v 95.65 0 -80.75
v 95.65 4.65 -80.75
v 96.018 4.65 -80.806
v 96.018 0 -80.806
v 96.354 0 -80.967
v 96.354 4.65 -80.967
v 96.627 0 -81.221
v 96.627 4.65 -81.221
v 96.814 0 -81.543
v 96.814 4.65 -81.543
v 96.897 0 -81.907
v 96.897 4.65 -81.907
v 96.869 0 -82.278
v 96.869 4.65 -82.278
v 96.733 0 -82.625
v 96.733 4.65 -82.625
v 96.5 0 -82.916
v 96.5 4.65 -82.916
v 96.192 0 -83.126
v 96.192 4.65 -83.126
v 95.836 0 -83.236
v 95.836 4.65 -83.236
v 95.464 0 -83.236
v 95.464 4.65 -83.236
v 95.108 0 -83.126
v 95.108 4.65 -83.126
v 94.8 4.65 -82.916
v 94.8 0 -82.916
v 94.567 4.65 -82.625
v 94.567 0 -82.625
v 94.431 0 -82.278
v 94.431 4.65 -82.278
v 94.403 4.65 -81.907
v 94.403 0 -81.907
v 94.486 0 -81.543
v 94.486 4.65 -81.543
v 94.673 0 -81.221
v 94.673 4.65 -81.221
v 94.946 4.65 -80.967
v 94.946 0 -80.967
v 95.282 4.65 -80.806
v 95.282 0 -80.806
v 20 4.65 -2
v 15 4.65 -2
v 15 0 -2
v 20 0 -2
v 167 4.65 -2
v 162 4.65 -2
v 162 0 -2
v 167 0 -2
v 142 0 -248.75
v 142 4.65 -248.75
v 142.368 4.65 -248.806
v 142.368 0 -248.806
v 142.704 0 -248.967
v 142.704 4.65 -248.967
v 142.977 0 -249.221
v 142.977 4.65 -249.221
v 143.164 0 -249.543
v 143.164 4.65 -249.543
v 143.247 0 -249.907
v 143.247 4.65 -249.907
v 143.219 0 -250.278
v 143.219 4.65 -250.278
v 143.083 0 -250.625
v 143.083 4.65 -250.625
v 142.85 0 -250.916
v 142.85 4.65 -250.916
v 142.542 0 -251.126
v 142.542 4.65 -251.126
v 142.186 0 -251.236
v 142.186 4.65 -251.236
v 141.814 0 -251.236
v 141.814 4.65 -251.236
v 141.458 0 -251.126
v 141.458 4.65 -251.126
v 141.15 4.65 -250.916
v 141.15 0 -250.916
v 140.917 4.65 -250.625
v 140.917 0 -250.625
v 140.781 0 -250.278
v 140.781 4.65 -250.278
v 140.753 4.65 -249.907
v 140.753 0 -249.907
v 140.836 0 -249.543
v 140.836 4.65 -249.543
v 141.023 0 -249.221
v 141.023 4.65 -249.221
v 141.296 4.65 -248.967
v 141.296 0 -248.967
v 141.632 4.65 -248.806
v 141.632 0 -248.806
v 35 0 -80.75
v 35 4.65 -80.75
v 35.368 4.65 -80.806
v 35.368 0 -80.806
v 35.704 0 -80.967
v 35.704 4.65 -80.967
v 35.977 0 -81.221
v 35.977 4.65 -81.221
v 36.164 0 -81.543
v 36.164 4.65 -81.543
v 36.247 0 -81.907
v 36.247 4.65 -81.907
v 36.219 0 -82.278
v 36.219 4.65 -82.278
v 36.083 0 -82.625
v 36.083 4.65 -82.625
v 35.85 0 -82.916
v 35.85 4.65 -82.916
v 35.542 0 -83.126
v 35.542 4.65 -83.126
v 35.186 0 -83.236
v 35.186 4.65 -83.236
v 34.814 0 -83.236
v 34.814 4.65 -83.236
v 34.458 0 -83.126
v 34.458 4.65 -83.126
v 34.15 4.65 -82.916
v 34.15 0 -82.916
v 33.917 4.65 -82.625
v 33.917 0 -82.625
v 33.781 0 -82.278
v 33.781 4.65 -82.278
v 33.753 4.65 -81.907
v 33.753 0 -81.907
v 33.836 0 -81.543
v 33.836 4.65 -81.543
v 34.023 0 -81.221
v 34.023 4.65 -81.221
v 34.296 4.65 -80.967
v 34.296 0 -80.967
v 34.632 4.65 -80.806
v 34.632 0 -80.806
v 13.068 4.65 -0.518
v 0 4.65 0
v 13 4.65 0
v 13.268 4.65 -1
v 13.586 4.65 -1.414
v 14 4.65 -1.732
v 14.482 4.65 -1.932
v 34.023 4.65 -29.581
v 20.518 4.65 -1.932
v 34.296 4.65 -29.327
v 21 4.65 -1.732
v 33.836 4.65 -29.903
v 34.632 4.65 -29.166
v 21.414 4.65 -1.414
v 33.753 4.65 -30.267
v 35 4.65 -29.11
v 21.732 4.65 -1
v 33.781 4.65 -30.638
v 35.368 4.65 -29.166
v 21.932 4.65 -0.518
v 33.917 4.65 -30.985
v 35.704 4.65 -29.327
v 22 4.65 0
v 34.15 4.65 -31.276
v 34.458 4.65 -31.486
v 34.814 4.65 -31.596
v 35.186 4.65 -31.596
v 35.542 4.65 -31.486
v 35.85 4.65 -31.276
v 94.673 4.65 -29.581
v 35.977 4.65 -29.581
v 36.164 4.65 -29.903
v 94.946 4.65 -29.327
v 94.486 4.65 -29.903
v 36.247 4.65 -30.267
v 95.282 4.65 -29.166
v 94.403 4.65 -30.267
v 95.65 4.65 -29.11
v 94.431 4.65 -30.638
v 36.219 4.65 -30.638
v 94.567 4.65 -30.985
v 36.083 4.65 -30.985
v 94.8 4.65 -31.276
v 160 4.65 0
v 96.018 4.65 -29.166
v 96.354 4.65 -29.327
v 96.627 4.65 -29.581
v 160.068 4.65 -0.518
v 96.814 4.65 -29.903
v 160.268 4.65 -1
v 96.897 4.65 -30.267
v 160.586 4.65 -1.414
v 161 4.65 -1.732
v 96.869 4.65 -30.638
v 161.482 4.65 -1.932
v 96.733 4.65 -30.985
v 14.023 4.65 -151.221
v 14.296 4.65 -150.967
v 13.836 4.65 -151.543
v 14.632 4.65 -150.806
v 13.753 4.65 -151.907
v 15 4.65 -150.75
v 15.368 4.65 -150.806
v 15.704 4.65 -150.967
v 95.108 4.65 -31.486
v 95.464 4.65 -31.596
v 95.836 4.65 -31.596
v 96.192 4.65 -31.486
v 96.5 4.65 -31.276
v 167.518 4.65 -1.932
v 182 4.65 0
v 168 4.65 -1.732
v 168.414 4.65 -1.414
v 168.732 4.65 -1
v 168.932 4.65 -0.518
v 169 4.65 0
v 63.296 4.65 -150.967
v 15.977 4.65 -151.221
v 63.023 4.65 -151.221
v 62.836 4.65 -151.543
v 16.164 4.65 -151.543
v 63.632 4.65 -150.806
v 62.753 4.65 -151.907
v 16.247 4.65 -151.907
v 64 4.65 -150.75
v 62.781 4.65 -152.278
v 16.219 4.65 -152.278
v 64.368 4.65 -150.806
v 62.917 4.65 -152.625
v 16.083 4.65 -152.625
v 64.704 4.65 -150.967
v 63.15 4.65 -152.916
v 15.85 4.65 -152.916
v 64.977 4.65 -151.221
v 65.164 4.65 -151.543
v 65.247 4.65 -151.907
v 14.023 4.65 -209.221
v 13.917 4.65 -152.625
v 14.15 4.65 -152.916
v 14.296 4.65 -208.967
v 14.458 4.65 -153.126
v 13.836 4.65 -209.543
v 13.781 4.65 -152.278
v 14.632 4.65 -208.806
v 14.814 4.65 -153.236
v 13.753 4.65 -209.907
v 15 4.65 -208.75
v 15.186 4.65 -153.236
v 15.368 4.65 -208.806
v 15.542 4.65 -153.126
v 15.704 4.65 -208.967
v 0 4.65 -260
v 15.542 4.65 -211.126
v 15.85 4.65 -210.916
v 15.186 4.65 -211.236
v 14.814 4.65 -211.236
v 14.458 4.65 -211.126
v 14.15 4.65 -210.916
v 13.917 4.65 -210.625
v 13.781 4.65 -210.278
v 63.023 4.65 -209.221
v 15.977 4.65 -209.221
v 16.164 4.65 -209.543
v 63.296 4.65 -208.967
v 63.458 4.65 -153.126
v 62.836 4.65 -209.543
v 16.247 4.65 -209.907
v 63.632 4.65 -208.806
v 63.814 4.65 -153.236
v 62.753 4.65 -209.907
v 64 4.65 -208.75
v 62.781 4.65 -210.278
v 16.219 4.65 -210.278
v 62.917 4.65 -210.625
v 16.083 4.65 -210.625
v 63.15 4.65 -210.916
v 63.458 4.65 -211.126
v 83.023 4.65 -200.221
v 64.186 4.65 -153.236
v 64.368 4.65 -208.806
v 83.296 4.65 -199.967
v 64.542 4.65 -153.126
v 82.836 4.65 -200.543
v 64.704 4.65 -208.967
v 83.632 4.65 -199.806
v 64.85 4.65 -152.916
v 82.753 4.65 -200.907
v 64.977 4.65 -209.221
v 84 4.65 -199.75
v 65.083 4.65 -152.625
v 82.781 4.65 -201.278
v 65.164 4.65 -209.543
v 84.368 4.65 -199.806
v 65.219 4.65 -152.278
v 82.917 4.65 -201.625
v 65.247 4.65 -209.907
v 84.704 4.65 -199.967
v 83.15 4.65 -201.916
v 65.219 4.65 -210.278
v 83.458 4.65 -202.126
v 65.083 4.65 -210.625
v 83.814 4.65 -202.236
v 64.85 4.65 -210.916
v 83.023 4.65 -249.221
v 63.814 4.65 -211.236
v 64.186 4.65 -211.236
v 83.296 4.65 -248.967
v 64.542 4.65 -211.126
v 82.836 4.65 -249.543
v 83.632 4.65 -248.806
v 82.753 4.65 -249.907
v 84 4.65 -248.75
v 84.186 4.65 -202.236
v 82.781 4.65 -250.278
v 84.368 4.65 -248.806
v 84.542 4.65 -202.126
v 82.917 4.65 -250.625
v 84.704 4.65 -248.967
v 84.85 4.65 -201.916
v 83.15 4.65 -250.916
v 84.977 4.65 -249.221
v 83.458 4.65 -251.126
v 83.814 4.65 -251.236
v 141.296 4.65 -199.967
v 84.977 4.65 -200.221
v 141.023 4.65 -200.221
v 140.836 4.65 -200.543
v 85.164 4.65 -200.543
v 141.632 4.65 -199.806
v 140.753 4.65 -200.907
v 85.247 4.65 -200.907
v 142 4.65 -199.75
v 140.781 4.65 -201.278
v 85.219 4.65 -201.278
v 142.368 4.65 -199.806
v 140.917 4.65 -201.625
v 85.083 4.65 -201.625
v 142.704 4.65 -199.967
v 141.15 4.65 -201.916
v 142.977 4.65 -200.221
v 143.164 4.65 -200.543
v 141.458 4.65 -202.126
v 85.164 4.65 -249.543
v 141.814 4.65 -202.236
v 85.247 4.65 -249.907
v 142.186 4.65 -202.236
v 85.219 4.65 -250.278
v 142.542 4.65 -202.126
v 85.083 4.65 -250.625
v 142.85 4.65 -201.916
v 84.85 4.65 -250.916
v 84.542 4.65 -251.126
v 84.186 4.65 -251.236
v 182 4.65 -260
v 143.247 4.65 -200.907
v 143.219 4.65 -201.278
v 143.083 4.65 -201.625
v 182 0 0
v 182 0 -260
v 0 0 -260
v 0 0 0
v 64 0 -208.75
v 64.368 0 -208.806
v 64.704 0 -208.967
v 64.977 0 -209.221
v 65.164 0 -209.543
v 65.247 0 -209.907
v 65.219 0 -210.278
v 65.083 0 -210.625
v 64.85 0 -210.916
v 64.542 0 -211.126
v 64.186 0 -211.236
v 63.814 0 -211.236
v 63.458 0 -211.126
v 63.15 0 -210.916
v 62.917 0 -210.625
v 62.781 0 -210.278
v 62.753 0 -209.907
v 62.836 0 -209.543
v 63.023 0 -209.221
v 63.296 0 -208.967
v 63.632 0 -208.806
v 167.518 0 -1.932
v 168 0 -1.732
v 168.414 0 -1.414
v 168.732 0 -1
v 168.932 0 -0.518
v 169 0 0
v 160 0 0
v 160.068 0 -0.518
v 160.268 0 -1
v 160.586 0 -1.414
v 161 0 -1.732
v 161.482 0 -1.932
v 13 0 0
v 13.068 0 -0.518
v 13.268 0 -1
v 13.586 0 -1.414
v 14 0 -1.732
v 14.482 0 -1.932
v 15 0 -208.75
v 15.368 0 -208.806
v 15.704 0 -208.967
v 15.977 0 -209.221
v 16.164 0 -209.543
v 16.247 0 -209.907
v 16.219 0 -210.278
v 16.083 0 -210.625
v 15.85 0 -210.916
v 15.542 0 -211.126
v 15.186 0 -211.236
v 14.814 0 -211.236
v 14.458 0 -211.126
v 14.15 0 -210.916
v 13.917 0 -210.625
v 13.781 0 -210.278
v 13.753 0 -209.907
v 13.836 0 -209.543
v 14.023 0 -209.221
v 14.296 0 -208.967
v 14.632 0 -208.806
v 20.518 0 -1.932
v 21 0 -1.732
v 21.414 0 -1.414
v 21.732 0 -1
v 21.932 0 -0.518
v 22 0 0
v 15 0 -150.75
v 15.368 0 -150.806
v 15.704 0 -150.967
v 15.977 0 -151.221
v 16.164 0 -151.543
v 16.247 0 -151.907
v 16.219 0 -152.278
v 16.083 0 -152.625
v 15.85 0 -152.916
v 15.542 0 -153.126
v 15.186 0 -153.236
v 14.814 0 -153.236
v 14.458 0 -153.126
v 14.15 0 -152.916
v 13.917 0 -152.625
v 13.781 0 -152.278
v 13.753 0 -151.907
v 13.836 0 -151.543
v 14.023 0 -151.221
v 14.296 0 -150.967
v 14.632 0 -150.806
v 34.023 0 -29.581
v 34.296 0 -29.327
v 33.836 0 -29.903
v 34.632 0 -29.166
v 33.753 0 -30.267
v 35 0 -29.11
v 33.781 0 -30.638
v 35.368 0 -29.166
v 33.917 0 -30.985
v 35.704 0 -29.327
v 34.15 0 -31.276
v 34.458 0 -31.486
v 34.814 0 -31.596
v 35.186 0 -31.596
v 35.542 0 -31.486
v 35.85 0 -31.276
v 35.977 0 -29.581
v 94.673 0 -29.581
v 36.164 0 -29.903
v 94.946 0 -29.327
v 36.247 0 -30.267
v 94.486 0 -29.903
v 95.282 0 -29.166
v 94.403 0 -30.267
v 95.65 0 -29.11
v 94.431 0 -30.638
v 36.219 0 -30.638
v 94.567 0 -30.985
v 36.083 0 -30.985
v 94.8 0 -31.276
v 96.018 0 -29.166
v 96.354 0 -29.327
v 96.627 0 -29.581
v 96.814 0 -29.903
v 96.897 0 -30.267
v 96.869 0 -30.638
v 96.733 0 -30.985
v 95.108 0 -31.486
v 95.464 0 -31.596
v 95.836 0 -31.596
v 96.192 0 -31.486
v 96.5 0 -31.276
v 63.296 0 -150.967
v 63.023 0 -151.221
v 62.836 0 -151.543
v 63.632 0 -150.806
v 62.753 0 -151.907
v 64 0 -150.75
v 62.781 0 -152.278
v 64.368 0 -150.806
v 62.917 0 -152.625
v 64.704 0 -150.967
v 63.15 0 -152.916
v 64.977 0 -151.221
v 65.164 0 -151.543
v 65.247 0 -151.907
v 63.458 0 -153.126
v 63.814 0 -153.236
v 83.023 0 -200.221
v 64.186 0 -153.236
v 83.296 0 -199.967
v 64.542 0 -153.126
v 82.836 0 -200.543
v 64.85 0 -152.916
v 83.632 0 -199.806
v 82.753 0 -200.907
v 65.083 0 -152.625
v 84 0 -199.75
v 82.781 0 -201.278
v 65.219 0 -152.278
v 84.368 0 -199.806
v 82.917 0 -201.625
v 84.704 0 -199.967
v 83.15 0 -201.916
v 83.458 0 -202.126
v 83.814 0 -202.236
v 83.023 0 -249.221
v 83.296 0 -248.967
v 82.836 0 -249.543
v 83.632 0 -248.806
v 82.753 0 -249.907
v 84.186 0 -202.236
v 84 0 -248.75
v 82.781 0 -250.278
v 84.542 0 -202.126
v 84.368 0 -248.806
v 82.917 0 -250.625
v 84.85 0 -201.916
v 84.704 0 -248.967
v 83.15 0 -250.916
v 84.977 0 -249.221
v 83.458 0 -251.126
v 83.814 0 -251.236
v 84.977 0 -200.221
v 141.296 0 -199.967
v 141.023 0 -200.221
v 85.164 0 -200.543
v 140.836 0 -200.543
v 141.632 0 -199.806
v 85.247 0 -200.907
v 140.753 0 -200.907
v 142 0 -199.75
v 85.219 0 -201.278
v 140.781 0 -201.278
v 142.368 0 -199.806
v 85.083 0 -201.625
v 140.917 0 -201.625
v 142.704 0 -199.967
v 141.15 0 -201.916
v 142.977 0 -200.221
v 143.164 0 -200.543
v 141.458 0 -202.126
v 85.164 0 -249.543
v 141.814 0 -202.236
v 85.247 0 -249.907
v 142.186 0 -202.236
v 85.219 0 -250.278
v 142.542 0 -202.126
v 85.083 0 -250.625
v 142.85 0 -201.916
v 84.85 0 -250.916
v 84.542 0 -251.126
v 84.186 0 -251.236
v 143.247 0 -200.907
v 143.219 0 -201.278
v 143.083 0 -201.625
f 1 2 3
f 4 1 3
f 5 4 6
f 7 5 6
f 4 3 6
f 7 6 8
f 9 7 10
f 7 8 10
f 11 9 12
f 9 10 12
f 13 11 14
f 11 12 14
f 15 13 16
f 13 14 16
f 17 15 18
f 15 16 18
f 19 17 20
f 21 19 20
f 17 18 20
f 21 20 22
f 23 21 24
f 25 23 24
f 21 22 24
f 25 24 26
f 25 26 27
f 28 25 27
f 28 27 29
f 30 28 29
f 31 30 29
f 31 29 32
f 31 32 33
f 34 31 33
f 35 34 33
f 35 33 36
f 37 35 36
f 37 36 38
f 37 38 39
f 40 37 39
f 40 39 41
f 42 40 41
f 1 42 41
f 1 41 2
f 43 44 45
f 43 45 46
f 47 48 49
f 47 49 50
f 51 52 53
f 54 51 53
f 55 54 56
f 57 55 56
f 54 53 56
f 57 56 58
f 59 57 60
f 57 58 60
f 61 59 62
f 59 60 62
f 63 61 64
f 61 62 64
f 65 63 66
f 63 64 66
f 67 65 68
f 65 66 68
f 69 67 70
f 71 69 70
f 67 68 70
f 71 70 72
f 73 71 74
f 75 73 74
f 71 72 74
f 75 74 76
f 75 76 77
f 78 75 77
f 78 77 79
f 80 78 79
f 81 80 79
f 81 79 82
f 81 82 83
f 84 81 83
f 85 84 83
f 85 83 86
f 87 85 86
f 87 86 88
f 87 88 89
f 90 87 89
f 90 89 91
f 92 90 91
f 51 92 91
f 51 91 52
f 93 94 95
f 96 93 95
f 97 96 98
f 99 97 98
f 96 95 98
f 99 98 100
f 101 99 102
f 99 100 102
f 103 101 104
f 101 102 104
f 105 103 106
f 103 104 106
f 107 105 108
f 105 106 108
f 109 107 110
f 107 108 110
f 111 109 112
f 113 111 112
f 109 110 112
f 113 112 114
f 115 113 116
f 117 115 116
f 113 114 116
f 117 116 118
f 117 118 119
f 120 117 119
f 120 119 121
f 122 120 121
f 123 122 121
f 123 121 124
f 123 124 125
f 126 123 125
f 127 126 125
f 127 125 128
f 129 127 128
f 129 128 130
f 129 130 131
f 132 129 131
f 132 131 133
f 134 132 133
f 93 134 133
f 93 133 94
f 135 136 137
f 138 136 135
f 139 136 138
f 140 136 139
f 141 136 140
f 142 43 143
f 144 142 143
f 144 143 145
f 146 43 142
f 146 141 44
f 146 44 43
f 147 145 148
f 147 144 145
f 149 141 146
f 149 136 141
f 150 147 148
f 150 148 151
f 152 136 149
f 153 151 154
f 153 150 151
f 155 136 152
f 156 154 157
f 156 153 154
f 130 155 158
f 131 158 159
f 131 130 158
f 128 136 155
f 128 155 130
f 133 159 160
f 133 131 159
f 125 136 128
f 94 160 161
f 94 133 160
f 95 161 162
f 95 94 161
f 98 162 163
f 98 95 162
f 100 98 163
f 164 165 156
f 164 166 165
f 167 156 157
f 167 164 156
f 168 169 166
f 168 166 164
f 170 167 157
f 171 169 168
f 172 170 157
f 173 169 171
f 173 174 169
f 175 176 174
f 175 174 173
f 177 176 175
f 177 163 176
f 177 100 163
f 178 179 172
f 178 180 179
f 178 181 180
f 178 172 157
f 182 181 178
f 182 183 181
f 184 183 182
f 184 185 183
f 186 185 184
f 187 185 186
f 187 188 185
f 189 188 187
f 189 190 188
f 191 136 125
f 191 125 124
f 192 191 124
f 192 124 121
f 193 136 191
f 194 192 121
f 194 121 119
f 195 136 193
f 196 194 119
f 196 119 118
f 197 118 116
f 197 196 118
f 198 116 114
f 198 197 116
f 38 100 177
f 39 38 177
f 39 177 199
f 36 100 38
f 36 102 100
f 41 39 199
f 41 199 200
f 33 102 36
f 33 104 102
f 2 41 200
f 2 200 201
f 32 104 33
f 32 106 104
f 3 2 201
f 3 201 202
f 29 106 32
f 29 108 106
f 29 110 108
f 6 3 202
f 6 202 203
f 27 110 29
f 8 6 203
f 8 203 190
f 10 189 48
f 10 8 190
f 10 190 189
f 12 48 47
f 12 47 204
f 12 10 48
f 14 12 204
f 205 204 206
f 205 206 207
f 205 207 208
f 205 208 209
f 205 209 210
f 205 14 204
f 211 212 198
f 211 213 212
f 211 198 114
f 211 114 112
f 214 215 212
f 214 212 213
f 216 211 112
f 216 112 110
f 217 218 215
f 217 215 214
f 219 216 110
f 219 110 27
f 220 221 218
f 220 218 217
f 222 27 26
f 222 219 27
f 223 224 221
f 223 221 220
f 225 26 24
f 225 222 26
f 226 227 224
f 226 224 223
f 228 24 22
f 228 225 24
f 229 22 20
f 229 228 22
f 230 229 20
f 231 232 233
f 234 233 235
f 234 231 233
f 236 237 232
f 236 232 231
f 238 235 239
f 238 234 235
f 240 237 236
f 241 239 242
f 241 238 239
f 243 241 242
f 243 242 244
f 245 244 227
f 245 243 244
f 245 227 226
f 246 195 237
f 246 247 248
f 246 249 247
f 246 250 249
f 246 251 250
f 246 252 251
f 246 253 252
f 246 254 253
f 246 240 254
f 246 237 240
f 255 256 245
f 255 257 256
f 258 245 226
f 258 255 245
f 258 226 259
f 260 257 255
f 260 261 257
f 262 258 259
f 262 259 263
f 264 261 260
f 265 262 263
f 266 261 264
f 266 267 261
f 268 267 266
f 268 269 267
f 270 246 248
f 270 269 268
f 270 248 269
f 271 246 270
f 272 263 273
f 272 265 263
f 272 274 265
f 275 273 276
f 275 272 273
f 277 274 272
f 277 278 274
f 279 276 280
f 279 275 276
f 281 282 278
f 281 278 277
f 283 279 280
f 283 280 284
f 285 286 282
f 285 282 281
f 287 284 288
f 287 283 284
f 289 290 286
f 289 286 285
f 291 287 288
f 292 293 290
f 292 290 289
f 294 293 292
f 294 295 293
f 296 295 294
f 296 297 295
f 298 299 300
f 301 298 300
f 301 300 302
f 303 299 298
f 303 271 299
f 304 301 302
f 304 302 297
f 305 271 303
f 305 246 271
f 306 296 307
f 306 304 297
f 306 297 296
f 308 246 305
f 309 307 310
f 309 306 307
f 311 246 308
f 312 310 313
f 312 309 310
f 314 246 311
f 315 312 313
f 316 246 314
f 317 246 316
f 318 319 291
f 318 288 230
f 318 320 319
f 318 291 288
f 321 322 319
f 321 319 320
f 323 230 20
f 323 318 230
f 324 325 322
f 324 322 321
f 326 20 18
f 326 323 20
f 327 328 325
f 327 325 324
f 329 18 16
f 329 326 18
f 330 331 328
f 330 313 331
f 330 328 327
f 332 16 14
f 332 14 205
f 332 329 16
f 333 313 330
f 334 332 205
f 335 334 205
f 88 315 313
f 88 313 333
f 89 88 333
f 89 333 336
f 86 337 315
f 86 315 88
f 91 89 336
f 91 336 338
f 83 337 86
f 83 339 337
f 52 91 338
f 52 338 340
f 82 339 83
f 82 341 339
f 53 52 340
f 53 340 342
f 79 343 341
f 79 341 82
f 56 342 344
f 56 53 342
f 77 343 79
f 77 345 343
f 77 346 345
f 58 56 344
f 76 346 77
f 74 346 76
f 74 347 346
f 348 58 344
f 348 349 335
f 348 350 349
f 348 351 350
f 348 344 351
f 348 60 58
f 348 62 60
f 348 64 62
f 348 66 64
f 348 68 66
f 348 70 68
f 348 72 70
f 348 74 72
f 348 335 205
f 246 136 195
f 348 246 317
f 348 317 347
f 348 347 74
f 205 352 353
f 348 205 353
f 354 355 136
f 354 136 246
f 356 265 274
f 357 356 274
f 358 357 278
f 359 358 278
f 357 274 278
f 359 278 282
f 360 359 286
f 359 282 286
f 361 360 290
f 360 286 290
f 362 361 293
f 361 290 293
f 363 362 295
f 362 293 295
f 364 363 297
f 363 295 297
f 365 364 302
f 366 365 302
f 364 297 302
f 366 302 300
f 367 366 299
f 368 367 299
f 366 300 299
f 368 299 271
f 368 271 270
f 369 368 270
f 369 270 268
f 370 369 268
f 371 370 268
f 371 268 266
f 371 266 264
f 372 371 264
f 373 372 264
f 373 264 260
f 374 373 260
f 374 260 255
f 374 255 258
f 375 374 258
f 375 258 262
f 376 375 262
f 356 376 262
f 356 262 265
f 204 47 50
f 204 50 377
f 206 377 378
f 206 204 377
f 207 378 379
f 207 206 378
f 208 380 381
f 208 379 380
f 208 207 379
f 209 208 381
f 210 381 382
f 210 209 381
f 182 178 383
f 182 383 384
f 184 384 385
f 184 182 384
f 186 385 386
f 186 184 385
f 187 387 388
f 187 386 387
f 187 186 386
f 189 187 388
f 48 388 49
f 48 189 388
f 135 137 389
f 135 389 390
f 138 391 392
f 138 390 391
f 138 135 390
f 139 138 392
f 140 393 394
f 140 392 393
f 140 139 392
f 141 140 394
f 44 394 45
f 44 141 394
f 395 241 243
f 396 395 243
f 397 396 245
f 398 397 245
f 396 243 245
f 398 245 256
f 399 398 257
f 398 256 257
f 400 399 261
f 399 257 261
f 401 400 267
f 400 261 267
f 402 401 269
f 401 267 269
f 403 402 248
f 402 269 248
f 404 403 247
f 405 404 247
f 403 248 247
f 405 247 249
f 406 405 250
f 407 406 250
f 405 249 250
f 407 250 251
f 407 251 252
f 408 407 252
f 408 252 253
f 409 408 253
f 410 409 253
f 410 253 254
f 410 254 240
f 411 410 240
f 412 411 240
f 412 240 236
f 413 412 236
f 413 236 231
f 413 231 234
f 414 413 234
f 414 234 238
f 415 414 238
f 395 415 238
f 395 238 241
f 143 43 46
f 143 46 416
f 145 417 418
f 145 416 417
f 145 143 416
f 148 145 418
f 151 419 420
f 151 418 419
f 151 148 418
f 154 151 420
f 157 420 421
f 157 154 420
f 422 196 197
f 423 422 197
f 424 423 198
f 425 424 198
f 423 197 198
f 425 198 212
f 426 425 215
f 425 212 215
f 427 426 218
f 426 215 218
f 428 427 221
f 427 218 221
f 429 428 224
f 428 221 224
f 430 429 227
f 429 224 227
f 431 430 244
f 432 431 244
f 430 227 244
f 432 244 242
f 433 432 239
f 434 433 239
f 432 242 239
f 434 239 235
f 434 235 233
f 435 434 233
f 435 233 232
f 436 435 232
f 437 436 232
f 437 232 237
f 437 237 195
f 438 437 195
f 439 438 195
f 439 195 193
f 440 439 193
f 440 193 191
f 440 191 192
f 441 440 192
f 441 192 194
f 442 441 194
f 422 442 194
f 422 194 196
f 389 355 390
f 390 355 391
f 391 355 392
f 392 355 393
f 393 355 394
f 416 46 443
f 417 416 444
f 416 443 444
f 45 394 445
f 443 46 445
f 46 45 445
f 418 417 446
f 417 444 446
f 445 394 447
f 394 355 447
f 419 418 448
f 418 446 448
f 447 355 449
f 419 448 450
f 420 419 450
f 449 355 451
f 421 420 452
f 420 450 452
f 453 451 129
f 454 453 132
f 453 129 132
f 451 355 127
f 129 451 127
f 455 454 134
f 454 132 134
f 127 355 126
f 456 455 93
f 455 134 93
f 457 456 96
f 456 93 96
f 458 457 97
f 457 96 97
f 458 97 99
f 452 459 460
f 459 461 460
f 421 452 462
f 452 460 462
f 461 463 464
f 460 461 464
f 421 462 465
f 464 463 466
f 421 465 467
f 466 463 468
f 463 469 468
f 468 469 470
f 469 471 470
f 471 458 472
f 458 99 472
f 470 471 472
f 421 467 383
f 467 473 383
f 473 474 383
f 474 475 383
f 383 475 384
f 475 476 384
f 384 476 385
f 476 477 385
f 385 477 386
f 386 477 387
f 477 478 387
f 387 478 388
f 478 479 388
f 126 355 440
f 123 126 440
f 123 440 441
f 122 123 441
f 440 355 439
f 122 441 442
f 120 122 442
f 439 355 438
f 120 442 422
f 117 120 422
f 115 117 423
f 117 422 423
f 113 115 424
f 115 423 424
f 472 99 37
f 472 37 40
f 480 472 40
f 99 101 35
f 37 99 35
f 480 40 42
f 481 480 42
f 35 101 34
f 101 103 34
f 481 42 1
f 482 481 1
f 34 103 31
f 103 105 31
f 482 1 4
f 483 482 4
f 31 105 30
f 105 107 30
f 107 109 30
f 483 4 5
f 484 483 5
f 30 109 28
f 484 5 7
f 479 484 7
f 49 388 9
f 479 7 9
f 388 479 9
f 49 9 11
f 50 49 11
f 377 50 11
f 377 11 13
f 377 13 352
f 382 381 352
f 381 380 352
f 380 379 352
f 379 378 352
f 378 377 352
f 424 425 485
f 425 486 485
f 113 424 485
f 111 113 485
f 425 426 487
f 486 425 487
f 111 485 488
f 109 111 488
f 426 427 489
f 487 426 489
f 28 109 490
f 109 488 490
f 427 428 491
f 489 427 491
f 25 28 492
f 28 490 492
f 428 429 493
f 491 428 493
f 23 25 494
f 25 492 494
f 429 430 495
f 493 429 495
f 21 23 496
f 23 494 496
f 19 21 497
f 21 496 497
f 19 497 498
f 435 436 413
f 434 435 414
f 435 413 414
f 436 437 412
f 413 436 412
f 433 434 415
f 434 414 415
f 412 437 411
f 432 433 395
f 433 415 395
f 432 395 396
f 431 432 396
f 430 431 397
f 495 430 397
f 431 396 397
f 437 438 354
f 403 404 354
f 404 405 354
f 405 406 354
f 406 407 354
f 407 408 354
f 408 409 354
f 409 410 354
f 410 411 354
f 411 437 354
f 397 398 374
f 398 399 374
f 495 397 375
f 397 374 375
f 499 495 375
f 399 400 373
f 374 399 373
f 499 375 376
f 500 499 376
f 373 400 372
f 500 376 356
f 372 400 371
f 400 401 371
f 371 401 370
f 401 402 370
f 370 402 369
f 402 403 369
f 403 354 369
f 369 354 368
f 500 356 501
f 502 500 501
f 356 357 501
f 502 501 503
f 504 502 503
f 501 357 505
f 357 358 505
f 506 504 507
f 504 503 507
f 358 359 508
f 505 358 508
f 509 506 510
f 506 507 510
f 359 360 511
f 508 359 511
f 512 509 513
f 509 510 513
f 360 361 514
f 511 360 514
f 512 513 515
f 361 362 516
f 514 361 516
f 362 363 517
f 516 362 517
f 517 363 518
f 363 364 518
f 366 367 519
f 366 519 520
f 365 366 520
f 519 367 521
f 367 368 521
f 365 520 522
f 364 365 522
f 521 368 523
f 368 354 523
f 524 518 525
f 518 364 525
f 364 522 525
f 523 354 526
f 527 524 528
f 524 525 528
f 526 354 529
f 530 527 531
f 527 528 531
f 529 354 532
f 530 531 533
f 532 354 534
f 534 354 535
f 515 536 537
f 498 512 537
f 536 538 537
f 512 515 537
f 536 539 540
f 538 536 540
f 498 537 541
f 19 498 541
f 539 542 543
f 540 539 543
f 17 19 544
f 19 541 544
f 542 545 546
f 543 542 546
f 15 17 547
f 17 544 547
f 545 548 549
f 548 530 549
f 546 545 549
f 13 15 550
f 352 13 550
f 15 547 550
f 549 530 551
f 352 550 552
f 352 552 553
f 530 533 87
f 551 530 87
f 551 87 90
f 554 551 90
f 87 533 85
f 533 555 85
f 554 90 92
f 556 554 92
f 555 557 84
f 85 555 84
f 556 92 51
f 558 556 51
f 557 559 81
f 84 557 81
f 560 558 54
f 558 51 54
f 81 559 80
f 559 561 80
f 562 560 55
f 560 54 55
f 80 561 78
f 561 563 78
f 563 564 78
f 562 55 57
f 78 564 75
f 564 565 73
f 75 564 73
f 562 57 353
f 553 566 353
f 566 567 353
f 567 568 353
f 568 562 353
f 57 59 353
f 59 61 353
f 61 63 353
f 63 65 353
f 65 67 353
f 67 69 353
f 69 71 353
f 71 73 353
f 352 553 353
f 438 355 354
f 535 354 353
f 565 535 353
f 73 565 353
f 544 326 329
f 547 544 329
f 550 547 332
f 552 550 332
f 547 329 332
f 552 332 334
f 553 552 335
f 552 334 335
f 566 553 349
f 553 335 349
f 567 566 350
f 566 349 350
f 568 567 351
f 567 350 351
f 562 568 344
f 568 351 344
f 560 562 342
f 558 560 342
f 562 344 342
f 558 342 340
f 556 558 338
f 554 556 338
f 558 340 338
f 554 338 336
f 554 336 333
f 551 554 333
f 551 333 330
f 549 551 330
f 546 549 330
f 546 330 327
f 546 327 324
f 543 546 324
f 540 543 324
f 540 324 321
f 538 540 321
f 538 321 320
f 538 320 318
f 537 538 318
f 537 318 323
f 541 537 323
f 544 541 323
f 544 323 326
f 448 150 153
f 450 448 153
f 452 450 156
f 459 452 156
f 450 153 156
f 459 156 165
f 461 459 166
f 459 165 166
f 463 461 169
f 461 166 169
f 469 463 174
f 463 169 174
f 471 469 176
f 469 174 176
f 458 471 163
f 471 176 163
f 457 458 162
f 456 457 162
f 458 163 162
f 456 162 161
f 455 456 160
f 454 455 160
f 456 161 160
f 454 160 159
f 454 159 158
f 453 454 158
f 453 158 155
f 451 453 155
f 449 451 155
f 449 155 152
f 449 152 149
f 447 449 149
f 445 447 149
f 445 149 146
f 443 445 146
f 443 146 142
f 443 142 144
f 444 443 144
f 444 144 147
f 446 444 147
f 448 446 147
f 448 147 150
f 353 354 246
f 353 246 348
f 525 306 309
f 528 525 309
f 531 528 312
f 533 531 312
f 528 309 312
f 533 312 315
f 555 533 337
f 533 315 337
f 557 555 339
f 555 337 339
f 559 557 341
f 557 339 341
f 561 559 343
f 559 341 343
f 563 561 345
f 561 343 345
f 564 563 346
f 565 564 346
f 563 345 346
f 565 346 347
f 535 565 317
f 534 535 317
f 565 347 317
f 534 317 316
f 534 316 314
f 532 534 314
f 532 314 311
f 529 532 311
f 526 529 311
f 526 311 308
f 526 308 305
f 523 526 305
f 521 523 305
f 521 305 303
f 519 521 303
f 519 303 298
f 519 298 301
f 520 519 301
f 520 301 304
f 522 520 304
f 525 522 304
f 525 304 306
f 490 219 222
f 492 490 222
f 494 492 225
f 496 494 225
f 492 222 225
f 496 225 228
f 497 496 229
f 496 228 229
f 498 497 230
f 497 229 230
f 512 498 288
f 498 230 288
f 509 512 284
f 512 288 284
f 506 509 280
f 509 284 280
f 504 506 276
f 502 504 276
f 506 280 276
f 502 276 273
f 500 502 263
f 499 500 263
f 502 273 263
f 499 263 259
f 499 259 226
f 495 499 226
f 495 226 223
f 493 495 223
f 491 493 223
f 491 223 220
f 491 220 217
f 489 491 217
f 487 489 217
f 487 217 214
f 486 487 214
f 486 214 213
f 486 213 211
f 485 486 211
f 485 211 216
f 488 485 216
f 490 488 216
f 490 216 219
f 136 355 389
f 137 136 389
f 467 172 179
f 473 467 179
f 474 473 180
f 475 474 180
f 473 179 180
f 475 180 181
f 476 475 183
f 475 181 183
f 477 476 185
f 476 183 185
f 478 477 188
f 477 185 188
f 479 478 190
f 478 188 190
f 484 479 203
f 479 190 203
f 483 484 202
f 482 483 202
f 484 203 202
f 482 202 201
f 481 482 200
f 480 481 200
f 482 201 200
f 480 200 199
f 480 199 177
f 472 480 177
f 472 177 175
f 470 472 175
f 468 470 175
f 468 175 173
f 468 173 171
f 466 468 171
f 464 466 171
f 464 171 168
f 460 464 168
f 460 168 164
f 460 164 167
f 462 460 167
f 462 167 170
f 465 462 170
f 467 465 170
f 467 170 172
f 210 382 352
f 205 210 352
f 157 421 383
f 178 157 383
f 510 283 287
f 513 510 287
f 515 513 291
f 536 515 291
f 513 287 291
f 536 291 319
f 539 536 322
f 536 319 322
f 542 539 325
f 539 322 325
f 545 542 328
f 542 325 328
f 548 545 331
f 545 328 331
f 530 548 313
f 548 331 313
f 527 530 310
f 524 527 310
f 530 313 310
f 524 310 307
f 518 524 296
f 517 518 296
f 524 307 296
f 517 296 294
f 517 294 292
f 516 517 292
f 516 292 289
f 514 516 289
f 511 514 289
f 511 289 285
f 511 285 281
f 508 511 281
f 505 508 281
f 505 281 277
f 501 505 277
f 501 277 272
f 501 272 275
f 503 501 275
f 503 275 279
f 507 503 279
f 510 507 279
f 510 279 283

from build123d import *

# Parameters (mm, degrees)
SKETCH_1_W          = 182
SKETCH_1_H          = 260
EXTRUDE_1_DEPTH     = 4.65
CUT_EXTRUDE_1_REACH = 319.405
PCB_REACH           = 319.405
SKETCH_3_R          = 1.25


with BuildPart() as part:
    # 草图1 → 凸台-拉伸1 (new body)
    with BuildSketch(Plane(origin=(0, 0, 0), x_dir=(1, 0, 0), z_dir=(0, 1, 0))):
        with Locations((91, 130)):
            Rectangle(SKETCH_1_W, SKETCH_1_H)
    extrude(amount=EXTRUDE_1_DEPTH)

    # 草图2 → 切除-拉伸1 (cut, up to next)
    with BuildSketch(Plane(origin=(0, 4.65, 0), x_dir=(1, 0, 0), z_dir=(0, 1, 0)), mode=Mode.PRIVATE) as cut_extrude_1_sk1:
        with BuildLine():
            Line((15, 2), (20, 2))
            ThreePointArc((20, 2), (21.414213562, 1.414213562), (22, 0))
            Line((22, 0), (13, 0))
            ThreePointArc((13, 0), (13.585786438, 1.414213562), (15, 2))
        make_face()
    cut_extrude_1_tool1 = extrude(cut_extrude_1_sk1.sketch, amount=-CUT_EXTRUDE_1_REACH, mode=Mode.PRIVATE) & part.part
    # 草图2 → 切除-拉伸1 (cut, up to next)
    with BuildSketch(Plane(origin=(0, 4.65, 0), x_dir=(1, 0, 0), z_dir=(0, 1, 0)), mode=Mode.PRIVATE) as cut_extrude_1_sk2:
        with BuildLine():
            Line((162, 2), (167, 2))
            ThreePointArc((167, 2), (168.414213562, 1.414213562), (169, 0))
            Line((169, 0), (160, 0))
            ThreePointArc((160, 0), (160.585786438, 1.414213562), (162, 2))
        make_face()
    cut_extrude_1_tool2 = extrude(cut_extrude_1_sk2.sketch, amount=-CUT_EXTRUDE_1_REACH, mode=Mode.PRIVATE) & part.part
    add(cut_extrude_1_tool1.solids().sort_by_distance((17.5, 4.65, -0.941667))[0], mode=Mode.SUBTRACT)
    add(cut_extrude_1_tool2.solids().sort_by_distance((164.5, 4.65, -0.941667))[0], mode=Mode.SUBTRACT)

    # 草图3 → pcb (cut, up to next)
    with BuildSketch(Plane(origin=(0, 4.65, 0), x_dir=(1, 0, 0), z_dir=(0, 1, 0)), mode=Mode.PRIVATE) as pcb_sk1:
        with Locations(Location((35, 30.36, 0), (0, 0, 270))):
            Circle(SKETCH_3_R)
    pcb_tool1 = extrude(pcb_sk1.sketch, amount=-PCB_REACH, mode=Mode.PRIVATE) & part.part
    # 草图3 → pcb (cut, up to next)
    with BuildSketch(Plane(origin=(0, 4.65, 0), x_dir=(1, 0, 0), z_dir=(0, 1, 0)), mode=Mode.PRIVATE) as pcb_sk2:
        with Locations(Location((95.65, 30.36, 0), (0, 0, 270))):
            Circle(SKETCH_3_R)
    pcb_tool2 = extrude(pcb_sk2.sketch, amount=-PCB_REACH, mode=Mode.PRIVATE) & part.part
    # 草图3 → pcb (cut, up to next)
    with BuildSketch(Plane(origin=(0, 4.65, 0), x_dir=(1, 0, 0), z_dir=(0, 1, 0)), mode=Mode.PRIVATE) as pcb_sk3:
        with Locations(Location((35, 82, 0), (0, 0, 270))):
            Circle(SKETCH_3_R)
    pcb_tool3 = extrude(pcb_sk3.sketch, amount=-PCB_REACH, mode=Mode.PRIVATE) & part.part
    # 草图3 → pcb (cut, up to next)
    with BuildSketch(Plane(origin=(0, 4.65, 0), x_dir=(1, 0, 0), z_dir=(0, 1, 0)), mode=Mode.PRIVATE) as pcb_sk4:
        with Locations(Location((95.65, 82, 0), (0, 0, 270))):
            Circle(SKETCH_3_R)
    pcb_tool4 = extrude(pcb_sk4.sketch, amount=-PCB_REACH, mode=Mode.PRIVATE) & part.part
    # 草图3 → pcb (cut, up to next)
    with BuildSketch(Plane(origin=(0, 4.65, 0), x_dir=(1, 0, 0), z_dir=(0, 1, 0)), mode=Mode.PRIVATE) as pcb_sk5:
        with Locations(Location((15, 210, 0), (0, 0, 270))):
            Circle(SKETCH_3_R)
    pcb_tool5 = extrude(pcb_sk5.sketch, amount=-PCB_REACH, mode=Mode.PRIVATE) & part.part
    # 草图3 → pcb (cut, up to next)
    with BuildSketch(Plane(origin=(0, 4.65, 0), x_dir=(1, 0, 0), z_dir=(0, 1, 0)), mode=Mode.PRIVATE) as pcb_sk6:
        with Locations(Location((64, 210, 0), (0, 0, 270))):
            Circle(SKETCH_3_R)
    pcb_tool6 = extrude(pcb_sk6.sketch, amount=-PCB_REACH, mode=Mode.PRIVATE) & part.part
    # 草图3 → pcb (cut, up to next)
    with BuildSketch(Plane(origin=(0, 4.65, 0), x_dir=(1, 0, 0), z_dir=(0, 1, 0)), mode=Mode.PRIVATE) as pcb_sk7:
        with Locations(Location((64, 152, 0), (0, 0, 270))):
            Circle(SKETCH_3_R)
    pcb_tool7 = extrude(pcb_sk7.sketch, amount=-PCB_REACH, mode=Mode.PRIVATE) & part.part
    # 草图3 → pcb (cut, up to next)
    with BuildSketch(Plane(origin=(0, 4.65, 0), x_dir=(1, 0, 0), z_dir=(0, 1, 0)), mode=Mode.PRIVATE) as pcb_sk8:
        with Locations(Location((15, 152, 0), (0, 0, 270))):
            Circle(SKETCH_3_R)
    pcb_tool8 = extrude(pcb_sk8.sketch, amount=-PCB_REACH, mode=Mode.PRIVATE) & part.part
    # 草图3 → pcb (cut, up to next)
    with BuildSketch(Plane(origin=(0, 4.65, 0), x_dir=(1, 0, 0), z_dir=(0, 1, 0)), mode=Mode.PRIVATE) as pcb_sk9:
        with Locations(Location((84, 250, 0), (0, 0, 270))):
            Circle(SKETCH_3_R)
    pcb_tool9 = extrude(pcb_sk9.sketch, amount=-PCB_REACH, mode=Mode.PRIVATE) & part.part
    # 草图3 → pcb (cut, up to next)
    with BuildSketch(Plane(origin=(0, 4.65, 0), x_dir=(1, 0, 0), z_dir=(0, 1, 0)), mode=Mode.PRIVATE) as pcb_sk10:
        with Locations(Location((142, 250, 0), (0, 0, 270))):
            Circle(SKETCH_3_R)
    pcb_tool10 = extrude(pcb_sk10.sketch, amount=-PCB_REACH, mode=Mode.PRIVATE) & part.part
    # 草图3 → pcb (cut, up to next)
    with BuildSketch(Plane(origin=(0, 4.65, 0), x_dir=(1, 0, 0), z_dir=(0, 1, 0)), mode=Mode.PRIVATE) as pcb_sk11:
        with Locations(Location((84, 201, 0), (0, 0, 270))):
            Circle(SKETCH_3_R)
    pcb_tool11 = extrude(pcb_sk11.sketch, amount=-PCB_REACH, mode=Mode.PRIVATE) & part.part
    # 草图3 → pcb (cut, up to next)
    with BuildSketch(Plane(origin=(0, 4.65, 0), x_dir=(1, 0, 0), z_dir=(0, 1, 0)), mode=Mode.PRIVATE) as pcb_sk12:
        with Locations(Location((142, 201, 0), (0, 0, 270))):
            Circle(SKETCH_3_R)
    pcb_tool12 = extrude(pcb_sk12.sketch, amount=-PCB_REACH, mode=Mode.PRIVATE) & part.part
    add(pcb_tool1.solids().sort_by_distance((35, 4.65, -30.36))[0], mode=Mode.SUBTRACT)
    add(pcb_tool2.solids().sort_by_distance((95.65, 4.65, -30.36))[0], mode=Mode.SUBTRACT)
    add(pcb_tool3.solids().sort_by_distance((35, 4.65, -82))[0], mode=Mode.SUBTRACT)
    add(pcb_tool4.solids().sort_by_distance((95.65, 4.65, -82))[0], mode=Mode.SUBTRACT)
    add(pcb_tool5.solids().sort_by_distance((15, 4.65, -210))[0], mode=Mode.SUBTRACT)
    add(pcb_tool6.solids().sort_by_distance((64, 4.65, -210))[0], mode=Mode.SUBTRACT)
    add(pcb_tool7.solids().sort_by_distance((64, 4.65, -152))[0], mode=Mode.SUBTRACT)
    add(pcb_tool8.solids().sort_by_distance((15, 4.65, -152))[0], mode=Mode.SUBTRACT)
    add(pcb_tool9.solids().sort_by_distance((84, 4.65, -250))[0], mode=Mode.SUBTRACT)
    add(pcb_tool10.solids().sort_by_distance((142, 4.65, -250))[0], mode=Mode.SUBTRACT)
    add(pcb_tool11.solids().sort_by_distance((84, 4.65, -201))[0], mode=Mode.SUBTRACT)
    add(pcb_tool12.solids().sort_by_distance((142, 4.65, -201))[0], mode=Mode.SUBTRACT)


solid = part.part
